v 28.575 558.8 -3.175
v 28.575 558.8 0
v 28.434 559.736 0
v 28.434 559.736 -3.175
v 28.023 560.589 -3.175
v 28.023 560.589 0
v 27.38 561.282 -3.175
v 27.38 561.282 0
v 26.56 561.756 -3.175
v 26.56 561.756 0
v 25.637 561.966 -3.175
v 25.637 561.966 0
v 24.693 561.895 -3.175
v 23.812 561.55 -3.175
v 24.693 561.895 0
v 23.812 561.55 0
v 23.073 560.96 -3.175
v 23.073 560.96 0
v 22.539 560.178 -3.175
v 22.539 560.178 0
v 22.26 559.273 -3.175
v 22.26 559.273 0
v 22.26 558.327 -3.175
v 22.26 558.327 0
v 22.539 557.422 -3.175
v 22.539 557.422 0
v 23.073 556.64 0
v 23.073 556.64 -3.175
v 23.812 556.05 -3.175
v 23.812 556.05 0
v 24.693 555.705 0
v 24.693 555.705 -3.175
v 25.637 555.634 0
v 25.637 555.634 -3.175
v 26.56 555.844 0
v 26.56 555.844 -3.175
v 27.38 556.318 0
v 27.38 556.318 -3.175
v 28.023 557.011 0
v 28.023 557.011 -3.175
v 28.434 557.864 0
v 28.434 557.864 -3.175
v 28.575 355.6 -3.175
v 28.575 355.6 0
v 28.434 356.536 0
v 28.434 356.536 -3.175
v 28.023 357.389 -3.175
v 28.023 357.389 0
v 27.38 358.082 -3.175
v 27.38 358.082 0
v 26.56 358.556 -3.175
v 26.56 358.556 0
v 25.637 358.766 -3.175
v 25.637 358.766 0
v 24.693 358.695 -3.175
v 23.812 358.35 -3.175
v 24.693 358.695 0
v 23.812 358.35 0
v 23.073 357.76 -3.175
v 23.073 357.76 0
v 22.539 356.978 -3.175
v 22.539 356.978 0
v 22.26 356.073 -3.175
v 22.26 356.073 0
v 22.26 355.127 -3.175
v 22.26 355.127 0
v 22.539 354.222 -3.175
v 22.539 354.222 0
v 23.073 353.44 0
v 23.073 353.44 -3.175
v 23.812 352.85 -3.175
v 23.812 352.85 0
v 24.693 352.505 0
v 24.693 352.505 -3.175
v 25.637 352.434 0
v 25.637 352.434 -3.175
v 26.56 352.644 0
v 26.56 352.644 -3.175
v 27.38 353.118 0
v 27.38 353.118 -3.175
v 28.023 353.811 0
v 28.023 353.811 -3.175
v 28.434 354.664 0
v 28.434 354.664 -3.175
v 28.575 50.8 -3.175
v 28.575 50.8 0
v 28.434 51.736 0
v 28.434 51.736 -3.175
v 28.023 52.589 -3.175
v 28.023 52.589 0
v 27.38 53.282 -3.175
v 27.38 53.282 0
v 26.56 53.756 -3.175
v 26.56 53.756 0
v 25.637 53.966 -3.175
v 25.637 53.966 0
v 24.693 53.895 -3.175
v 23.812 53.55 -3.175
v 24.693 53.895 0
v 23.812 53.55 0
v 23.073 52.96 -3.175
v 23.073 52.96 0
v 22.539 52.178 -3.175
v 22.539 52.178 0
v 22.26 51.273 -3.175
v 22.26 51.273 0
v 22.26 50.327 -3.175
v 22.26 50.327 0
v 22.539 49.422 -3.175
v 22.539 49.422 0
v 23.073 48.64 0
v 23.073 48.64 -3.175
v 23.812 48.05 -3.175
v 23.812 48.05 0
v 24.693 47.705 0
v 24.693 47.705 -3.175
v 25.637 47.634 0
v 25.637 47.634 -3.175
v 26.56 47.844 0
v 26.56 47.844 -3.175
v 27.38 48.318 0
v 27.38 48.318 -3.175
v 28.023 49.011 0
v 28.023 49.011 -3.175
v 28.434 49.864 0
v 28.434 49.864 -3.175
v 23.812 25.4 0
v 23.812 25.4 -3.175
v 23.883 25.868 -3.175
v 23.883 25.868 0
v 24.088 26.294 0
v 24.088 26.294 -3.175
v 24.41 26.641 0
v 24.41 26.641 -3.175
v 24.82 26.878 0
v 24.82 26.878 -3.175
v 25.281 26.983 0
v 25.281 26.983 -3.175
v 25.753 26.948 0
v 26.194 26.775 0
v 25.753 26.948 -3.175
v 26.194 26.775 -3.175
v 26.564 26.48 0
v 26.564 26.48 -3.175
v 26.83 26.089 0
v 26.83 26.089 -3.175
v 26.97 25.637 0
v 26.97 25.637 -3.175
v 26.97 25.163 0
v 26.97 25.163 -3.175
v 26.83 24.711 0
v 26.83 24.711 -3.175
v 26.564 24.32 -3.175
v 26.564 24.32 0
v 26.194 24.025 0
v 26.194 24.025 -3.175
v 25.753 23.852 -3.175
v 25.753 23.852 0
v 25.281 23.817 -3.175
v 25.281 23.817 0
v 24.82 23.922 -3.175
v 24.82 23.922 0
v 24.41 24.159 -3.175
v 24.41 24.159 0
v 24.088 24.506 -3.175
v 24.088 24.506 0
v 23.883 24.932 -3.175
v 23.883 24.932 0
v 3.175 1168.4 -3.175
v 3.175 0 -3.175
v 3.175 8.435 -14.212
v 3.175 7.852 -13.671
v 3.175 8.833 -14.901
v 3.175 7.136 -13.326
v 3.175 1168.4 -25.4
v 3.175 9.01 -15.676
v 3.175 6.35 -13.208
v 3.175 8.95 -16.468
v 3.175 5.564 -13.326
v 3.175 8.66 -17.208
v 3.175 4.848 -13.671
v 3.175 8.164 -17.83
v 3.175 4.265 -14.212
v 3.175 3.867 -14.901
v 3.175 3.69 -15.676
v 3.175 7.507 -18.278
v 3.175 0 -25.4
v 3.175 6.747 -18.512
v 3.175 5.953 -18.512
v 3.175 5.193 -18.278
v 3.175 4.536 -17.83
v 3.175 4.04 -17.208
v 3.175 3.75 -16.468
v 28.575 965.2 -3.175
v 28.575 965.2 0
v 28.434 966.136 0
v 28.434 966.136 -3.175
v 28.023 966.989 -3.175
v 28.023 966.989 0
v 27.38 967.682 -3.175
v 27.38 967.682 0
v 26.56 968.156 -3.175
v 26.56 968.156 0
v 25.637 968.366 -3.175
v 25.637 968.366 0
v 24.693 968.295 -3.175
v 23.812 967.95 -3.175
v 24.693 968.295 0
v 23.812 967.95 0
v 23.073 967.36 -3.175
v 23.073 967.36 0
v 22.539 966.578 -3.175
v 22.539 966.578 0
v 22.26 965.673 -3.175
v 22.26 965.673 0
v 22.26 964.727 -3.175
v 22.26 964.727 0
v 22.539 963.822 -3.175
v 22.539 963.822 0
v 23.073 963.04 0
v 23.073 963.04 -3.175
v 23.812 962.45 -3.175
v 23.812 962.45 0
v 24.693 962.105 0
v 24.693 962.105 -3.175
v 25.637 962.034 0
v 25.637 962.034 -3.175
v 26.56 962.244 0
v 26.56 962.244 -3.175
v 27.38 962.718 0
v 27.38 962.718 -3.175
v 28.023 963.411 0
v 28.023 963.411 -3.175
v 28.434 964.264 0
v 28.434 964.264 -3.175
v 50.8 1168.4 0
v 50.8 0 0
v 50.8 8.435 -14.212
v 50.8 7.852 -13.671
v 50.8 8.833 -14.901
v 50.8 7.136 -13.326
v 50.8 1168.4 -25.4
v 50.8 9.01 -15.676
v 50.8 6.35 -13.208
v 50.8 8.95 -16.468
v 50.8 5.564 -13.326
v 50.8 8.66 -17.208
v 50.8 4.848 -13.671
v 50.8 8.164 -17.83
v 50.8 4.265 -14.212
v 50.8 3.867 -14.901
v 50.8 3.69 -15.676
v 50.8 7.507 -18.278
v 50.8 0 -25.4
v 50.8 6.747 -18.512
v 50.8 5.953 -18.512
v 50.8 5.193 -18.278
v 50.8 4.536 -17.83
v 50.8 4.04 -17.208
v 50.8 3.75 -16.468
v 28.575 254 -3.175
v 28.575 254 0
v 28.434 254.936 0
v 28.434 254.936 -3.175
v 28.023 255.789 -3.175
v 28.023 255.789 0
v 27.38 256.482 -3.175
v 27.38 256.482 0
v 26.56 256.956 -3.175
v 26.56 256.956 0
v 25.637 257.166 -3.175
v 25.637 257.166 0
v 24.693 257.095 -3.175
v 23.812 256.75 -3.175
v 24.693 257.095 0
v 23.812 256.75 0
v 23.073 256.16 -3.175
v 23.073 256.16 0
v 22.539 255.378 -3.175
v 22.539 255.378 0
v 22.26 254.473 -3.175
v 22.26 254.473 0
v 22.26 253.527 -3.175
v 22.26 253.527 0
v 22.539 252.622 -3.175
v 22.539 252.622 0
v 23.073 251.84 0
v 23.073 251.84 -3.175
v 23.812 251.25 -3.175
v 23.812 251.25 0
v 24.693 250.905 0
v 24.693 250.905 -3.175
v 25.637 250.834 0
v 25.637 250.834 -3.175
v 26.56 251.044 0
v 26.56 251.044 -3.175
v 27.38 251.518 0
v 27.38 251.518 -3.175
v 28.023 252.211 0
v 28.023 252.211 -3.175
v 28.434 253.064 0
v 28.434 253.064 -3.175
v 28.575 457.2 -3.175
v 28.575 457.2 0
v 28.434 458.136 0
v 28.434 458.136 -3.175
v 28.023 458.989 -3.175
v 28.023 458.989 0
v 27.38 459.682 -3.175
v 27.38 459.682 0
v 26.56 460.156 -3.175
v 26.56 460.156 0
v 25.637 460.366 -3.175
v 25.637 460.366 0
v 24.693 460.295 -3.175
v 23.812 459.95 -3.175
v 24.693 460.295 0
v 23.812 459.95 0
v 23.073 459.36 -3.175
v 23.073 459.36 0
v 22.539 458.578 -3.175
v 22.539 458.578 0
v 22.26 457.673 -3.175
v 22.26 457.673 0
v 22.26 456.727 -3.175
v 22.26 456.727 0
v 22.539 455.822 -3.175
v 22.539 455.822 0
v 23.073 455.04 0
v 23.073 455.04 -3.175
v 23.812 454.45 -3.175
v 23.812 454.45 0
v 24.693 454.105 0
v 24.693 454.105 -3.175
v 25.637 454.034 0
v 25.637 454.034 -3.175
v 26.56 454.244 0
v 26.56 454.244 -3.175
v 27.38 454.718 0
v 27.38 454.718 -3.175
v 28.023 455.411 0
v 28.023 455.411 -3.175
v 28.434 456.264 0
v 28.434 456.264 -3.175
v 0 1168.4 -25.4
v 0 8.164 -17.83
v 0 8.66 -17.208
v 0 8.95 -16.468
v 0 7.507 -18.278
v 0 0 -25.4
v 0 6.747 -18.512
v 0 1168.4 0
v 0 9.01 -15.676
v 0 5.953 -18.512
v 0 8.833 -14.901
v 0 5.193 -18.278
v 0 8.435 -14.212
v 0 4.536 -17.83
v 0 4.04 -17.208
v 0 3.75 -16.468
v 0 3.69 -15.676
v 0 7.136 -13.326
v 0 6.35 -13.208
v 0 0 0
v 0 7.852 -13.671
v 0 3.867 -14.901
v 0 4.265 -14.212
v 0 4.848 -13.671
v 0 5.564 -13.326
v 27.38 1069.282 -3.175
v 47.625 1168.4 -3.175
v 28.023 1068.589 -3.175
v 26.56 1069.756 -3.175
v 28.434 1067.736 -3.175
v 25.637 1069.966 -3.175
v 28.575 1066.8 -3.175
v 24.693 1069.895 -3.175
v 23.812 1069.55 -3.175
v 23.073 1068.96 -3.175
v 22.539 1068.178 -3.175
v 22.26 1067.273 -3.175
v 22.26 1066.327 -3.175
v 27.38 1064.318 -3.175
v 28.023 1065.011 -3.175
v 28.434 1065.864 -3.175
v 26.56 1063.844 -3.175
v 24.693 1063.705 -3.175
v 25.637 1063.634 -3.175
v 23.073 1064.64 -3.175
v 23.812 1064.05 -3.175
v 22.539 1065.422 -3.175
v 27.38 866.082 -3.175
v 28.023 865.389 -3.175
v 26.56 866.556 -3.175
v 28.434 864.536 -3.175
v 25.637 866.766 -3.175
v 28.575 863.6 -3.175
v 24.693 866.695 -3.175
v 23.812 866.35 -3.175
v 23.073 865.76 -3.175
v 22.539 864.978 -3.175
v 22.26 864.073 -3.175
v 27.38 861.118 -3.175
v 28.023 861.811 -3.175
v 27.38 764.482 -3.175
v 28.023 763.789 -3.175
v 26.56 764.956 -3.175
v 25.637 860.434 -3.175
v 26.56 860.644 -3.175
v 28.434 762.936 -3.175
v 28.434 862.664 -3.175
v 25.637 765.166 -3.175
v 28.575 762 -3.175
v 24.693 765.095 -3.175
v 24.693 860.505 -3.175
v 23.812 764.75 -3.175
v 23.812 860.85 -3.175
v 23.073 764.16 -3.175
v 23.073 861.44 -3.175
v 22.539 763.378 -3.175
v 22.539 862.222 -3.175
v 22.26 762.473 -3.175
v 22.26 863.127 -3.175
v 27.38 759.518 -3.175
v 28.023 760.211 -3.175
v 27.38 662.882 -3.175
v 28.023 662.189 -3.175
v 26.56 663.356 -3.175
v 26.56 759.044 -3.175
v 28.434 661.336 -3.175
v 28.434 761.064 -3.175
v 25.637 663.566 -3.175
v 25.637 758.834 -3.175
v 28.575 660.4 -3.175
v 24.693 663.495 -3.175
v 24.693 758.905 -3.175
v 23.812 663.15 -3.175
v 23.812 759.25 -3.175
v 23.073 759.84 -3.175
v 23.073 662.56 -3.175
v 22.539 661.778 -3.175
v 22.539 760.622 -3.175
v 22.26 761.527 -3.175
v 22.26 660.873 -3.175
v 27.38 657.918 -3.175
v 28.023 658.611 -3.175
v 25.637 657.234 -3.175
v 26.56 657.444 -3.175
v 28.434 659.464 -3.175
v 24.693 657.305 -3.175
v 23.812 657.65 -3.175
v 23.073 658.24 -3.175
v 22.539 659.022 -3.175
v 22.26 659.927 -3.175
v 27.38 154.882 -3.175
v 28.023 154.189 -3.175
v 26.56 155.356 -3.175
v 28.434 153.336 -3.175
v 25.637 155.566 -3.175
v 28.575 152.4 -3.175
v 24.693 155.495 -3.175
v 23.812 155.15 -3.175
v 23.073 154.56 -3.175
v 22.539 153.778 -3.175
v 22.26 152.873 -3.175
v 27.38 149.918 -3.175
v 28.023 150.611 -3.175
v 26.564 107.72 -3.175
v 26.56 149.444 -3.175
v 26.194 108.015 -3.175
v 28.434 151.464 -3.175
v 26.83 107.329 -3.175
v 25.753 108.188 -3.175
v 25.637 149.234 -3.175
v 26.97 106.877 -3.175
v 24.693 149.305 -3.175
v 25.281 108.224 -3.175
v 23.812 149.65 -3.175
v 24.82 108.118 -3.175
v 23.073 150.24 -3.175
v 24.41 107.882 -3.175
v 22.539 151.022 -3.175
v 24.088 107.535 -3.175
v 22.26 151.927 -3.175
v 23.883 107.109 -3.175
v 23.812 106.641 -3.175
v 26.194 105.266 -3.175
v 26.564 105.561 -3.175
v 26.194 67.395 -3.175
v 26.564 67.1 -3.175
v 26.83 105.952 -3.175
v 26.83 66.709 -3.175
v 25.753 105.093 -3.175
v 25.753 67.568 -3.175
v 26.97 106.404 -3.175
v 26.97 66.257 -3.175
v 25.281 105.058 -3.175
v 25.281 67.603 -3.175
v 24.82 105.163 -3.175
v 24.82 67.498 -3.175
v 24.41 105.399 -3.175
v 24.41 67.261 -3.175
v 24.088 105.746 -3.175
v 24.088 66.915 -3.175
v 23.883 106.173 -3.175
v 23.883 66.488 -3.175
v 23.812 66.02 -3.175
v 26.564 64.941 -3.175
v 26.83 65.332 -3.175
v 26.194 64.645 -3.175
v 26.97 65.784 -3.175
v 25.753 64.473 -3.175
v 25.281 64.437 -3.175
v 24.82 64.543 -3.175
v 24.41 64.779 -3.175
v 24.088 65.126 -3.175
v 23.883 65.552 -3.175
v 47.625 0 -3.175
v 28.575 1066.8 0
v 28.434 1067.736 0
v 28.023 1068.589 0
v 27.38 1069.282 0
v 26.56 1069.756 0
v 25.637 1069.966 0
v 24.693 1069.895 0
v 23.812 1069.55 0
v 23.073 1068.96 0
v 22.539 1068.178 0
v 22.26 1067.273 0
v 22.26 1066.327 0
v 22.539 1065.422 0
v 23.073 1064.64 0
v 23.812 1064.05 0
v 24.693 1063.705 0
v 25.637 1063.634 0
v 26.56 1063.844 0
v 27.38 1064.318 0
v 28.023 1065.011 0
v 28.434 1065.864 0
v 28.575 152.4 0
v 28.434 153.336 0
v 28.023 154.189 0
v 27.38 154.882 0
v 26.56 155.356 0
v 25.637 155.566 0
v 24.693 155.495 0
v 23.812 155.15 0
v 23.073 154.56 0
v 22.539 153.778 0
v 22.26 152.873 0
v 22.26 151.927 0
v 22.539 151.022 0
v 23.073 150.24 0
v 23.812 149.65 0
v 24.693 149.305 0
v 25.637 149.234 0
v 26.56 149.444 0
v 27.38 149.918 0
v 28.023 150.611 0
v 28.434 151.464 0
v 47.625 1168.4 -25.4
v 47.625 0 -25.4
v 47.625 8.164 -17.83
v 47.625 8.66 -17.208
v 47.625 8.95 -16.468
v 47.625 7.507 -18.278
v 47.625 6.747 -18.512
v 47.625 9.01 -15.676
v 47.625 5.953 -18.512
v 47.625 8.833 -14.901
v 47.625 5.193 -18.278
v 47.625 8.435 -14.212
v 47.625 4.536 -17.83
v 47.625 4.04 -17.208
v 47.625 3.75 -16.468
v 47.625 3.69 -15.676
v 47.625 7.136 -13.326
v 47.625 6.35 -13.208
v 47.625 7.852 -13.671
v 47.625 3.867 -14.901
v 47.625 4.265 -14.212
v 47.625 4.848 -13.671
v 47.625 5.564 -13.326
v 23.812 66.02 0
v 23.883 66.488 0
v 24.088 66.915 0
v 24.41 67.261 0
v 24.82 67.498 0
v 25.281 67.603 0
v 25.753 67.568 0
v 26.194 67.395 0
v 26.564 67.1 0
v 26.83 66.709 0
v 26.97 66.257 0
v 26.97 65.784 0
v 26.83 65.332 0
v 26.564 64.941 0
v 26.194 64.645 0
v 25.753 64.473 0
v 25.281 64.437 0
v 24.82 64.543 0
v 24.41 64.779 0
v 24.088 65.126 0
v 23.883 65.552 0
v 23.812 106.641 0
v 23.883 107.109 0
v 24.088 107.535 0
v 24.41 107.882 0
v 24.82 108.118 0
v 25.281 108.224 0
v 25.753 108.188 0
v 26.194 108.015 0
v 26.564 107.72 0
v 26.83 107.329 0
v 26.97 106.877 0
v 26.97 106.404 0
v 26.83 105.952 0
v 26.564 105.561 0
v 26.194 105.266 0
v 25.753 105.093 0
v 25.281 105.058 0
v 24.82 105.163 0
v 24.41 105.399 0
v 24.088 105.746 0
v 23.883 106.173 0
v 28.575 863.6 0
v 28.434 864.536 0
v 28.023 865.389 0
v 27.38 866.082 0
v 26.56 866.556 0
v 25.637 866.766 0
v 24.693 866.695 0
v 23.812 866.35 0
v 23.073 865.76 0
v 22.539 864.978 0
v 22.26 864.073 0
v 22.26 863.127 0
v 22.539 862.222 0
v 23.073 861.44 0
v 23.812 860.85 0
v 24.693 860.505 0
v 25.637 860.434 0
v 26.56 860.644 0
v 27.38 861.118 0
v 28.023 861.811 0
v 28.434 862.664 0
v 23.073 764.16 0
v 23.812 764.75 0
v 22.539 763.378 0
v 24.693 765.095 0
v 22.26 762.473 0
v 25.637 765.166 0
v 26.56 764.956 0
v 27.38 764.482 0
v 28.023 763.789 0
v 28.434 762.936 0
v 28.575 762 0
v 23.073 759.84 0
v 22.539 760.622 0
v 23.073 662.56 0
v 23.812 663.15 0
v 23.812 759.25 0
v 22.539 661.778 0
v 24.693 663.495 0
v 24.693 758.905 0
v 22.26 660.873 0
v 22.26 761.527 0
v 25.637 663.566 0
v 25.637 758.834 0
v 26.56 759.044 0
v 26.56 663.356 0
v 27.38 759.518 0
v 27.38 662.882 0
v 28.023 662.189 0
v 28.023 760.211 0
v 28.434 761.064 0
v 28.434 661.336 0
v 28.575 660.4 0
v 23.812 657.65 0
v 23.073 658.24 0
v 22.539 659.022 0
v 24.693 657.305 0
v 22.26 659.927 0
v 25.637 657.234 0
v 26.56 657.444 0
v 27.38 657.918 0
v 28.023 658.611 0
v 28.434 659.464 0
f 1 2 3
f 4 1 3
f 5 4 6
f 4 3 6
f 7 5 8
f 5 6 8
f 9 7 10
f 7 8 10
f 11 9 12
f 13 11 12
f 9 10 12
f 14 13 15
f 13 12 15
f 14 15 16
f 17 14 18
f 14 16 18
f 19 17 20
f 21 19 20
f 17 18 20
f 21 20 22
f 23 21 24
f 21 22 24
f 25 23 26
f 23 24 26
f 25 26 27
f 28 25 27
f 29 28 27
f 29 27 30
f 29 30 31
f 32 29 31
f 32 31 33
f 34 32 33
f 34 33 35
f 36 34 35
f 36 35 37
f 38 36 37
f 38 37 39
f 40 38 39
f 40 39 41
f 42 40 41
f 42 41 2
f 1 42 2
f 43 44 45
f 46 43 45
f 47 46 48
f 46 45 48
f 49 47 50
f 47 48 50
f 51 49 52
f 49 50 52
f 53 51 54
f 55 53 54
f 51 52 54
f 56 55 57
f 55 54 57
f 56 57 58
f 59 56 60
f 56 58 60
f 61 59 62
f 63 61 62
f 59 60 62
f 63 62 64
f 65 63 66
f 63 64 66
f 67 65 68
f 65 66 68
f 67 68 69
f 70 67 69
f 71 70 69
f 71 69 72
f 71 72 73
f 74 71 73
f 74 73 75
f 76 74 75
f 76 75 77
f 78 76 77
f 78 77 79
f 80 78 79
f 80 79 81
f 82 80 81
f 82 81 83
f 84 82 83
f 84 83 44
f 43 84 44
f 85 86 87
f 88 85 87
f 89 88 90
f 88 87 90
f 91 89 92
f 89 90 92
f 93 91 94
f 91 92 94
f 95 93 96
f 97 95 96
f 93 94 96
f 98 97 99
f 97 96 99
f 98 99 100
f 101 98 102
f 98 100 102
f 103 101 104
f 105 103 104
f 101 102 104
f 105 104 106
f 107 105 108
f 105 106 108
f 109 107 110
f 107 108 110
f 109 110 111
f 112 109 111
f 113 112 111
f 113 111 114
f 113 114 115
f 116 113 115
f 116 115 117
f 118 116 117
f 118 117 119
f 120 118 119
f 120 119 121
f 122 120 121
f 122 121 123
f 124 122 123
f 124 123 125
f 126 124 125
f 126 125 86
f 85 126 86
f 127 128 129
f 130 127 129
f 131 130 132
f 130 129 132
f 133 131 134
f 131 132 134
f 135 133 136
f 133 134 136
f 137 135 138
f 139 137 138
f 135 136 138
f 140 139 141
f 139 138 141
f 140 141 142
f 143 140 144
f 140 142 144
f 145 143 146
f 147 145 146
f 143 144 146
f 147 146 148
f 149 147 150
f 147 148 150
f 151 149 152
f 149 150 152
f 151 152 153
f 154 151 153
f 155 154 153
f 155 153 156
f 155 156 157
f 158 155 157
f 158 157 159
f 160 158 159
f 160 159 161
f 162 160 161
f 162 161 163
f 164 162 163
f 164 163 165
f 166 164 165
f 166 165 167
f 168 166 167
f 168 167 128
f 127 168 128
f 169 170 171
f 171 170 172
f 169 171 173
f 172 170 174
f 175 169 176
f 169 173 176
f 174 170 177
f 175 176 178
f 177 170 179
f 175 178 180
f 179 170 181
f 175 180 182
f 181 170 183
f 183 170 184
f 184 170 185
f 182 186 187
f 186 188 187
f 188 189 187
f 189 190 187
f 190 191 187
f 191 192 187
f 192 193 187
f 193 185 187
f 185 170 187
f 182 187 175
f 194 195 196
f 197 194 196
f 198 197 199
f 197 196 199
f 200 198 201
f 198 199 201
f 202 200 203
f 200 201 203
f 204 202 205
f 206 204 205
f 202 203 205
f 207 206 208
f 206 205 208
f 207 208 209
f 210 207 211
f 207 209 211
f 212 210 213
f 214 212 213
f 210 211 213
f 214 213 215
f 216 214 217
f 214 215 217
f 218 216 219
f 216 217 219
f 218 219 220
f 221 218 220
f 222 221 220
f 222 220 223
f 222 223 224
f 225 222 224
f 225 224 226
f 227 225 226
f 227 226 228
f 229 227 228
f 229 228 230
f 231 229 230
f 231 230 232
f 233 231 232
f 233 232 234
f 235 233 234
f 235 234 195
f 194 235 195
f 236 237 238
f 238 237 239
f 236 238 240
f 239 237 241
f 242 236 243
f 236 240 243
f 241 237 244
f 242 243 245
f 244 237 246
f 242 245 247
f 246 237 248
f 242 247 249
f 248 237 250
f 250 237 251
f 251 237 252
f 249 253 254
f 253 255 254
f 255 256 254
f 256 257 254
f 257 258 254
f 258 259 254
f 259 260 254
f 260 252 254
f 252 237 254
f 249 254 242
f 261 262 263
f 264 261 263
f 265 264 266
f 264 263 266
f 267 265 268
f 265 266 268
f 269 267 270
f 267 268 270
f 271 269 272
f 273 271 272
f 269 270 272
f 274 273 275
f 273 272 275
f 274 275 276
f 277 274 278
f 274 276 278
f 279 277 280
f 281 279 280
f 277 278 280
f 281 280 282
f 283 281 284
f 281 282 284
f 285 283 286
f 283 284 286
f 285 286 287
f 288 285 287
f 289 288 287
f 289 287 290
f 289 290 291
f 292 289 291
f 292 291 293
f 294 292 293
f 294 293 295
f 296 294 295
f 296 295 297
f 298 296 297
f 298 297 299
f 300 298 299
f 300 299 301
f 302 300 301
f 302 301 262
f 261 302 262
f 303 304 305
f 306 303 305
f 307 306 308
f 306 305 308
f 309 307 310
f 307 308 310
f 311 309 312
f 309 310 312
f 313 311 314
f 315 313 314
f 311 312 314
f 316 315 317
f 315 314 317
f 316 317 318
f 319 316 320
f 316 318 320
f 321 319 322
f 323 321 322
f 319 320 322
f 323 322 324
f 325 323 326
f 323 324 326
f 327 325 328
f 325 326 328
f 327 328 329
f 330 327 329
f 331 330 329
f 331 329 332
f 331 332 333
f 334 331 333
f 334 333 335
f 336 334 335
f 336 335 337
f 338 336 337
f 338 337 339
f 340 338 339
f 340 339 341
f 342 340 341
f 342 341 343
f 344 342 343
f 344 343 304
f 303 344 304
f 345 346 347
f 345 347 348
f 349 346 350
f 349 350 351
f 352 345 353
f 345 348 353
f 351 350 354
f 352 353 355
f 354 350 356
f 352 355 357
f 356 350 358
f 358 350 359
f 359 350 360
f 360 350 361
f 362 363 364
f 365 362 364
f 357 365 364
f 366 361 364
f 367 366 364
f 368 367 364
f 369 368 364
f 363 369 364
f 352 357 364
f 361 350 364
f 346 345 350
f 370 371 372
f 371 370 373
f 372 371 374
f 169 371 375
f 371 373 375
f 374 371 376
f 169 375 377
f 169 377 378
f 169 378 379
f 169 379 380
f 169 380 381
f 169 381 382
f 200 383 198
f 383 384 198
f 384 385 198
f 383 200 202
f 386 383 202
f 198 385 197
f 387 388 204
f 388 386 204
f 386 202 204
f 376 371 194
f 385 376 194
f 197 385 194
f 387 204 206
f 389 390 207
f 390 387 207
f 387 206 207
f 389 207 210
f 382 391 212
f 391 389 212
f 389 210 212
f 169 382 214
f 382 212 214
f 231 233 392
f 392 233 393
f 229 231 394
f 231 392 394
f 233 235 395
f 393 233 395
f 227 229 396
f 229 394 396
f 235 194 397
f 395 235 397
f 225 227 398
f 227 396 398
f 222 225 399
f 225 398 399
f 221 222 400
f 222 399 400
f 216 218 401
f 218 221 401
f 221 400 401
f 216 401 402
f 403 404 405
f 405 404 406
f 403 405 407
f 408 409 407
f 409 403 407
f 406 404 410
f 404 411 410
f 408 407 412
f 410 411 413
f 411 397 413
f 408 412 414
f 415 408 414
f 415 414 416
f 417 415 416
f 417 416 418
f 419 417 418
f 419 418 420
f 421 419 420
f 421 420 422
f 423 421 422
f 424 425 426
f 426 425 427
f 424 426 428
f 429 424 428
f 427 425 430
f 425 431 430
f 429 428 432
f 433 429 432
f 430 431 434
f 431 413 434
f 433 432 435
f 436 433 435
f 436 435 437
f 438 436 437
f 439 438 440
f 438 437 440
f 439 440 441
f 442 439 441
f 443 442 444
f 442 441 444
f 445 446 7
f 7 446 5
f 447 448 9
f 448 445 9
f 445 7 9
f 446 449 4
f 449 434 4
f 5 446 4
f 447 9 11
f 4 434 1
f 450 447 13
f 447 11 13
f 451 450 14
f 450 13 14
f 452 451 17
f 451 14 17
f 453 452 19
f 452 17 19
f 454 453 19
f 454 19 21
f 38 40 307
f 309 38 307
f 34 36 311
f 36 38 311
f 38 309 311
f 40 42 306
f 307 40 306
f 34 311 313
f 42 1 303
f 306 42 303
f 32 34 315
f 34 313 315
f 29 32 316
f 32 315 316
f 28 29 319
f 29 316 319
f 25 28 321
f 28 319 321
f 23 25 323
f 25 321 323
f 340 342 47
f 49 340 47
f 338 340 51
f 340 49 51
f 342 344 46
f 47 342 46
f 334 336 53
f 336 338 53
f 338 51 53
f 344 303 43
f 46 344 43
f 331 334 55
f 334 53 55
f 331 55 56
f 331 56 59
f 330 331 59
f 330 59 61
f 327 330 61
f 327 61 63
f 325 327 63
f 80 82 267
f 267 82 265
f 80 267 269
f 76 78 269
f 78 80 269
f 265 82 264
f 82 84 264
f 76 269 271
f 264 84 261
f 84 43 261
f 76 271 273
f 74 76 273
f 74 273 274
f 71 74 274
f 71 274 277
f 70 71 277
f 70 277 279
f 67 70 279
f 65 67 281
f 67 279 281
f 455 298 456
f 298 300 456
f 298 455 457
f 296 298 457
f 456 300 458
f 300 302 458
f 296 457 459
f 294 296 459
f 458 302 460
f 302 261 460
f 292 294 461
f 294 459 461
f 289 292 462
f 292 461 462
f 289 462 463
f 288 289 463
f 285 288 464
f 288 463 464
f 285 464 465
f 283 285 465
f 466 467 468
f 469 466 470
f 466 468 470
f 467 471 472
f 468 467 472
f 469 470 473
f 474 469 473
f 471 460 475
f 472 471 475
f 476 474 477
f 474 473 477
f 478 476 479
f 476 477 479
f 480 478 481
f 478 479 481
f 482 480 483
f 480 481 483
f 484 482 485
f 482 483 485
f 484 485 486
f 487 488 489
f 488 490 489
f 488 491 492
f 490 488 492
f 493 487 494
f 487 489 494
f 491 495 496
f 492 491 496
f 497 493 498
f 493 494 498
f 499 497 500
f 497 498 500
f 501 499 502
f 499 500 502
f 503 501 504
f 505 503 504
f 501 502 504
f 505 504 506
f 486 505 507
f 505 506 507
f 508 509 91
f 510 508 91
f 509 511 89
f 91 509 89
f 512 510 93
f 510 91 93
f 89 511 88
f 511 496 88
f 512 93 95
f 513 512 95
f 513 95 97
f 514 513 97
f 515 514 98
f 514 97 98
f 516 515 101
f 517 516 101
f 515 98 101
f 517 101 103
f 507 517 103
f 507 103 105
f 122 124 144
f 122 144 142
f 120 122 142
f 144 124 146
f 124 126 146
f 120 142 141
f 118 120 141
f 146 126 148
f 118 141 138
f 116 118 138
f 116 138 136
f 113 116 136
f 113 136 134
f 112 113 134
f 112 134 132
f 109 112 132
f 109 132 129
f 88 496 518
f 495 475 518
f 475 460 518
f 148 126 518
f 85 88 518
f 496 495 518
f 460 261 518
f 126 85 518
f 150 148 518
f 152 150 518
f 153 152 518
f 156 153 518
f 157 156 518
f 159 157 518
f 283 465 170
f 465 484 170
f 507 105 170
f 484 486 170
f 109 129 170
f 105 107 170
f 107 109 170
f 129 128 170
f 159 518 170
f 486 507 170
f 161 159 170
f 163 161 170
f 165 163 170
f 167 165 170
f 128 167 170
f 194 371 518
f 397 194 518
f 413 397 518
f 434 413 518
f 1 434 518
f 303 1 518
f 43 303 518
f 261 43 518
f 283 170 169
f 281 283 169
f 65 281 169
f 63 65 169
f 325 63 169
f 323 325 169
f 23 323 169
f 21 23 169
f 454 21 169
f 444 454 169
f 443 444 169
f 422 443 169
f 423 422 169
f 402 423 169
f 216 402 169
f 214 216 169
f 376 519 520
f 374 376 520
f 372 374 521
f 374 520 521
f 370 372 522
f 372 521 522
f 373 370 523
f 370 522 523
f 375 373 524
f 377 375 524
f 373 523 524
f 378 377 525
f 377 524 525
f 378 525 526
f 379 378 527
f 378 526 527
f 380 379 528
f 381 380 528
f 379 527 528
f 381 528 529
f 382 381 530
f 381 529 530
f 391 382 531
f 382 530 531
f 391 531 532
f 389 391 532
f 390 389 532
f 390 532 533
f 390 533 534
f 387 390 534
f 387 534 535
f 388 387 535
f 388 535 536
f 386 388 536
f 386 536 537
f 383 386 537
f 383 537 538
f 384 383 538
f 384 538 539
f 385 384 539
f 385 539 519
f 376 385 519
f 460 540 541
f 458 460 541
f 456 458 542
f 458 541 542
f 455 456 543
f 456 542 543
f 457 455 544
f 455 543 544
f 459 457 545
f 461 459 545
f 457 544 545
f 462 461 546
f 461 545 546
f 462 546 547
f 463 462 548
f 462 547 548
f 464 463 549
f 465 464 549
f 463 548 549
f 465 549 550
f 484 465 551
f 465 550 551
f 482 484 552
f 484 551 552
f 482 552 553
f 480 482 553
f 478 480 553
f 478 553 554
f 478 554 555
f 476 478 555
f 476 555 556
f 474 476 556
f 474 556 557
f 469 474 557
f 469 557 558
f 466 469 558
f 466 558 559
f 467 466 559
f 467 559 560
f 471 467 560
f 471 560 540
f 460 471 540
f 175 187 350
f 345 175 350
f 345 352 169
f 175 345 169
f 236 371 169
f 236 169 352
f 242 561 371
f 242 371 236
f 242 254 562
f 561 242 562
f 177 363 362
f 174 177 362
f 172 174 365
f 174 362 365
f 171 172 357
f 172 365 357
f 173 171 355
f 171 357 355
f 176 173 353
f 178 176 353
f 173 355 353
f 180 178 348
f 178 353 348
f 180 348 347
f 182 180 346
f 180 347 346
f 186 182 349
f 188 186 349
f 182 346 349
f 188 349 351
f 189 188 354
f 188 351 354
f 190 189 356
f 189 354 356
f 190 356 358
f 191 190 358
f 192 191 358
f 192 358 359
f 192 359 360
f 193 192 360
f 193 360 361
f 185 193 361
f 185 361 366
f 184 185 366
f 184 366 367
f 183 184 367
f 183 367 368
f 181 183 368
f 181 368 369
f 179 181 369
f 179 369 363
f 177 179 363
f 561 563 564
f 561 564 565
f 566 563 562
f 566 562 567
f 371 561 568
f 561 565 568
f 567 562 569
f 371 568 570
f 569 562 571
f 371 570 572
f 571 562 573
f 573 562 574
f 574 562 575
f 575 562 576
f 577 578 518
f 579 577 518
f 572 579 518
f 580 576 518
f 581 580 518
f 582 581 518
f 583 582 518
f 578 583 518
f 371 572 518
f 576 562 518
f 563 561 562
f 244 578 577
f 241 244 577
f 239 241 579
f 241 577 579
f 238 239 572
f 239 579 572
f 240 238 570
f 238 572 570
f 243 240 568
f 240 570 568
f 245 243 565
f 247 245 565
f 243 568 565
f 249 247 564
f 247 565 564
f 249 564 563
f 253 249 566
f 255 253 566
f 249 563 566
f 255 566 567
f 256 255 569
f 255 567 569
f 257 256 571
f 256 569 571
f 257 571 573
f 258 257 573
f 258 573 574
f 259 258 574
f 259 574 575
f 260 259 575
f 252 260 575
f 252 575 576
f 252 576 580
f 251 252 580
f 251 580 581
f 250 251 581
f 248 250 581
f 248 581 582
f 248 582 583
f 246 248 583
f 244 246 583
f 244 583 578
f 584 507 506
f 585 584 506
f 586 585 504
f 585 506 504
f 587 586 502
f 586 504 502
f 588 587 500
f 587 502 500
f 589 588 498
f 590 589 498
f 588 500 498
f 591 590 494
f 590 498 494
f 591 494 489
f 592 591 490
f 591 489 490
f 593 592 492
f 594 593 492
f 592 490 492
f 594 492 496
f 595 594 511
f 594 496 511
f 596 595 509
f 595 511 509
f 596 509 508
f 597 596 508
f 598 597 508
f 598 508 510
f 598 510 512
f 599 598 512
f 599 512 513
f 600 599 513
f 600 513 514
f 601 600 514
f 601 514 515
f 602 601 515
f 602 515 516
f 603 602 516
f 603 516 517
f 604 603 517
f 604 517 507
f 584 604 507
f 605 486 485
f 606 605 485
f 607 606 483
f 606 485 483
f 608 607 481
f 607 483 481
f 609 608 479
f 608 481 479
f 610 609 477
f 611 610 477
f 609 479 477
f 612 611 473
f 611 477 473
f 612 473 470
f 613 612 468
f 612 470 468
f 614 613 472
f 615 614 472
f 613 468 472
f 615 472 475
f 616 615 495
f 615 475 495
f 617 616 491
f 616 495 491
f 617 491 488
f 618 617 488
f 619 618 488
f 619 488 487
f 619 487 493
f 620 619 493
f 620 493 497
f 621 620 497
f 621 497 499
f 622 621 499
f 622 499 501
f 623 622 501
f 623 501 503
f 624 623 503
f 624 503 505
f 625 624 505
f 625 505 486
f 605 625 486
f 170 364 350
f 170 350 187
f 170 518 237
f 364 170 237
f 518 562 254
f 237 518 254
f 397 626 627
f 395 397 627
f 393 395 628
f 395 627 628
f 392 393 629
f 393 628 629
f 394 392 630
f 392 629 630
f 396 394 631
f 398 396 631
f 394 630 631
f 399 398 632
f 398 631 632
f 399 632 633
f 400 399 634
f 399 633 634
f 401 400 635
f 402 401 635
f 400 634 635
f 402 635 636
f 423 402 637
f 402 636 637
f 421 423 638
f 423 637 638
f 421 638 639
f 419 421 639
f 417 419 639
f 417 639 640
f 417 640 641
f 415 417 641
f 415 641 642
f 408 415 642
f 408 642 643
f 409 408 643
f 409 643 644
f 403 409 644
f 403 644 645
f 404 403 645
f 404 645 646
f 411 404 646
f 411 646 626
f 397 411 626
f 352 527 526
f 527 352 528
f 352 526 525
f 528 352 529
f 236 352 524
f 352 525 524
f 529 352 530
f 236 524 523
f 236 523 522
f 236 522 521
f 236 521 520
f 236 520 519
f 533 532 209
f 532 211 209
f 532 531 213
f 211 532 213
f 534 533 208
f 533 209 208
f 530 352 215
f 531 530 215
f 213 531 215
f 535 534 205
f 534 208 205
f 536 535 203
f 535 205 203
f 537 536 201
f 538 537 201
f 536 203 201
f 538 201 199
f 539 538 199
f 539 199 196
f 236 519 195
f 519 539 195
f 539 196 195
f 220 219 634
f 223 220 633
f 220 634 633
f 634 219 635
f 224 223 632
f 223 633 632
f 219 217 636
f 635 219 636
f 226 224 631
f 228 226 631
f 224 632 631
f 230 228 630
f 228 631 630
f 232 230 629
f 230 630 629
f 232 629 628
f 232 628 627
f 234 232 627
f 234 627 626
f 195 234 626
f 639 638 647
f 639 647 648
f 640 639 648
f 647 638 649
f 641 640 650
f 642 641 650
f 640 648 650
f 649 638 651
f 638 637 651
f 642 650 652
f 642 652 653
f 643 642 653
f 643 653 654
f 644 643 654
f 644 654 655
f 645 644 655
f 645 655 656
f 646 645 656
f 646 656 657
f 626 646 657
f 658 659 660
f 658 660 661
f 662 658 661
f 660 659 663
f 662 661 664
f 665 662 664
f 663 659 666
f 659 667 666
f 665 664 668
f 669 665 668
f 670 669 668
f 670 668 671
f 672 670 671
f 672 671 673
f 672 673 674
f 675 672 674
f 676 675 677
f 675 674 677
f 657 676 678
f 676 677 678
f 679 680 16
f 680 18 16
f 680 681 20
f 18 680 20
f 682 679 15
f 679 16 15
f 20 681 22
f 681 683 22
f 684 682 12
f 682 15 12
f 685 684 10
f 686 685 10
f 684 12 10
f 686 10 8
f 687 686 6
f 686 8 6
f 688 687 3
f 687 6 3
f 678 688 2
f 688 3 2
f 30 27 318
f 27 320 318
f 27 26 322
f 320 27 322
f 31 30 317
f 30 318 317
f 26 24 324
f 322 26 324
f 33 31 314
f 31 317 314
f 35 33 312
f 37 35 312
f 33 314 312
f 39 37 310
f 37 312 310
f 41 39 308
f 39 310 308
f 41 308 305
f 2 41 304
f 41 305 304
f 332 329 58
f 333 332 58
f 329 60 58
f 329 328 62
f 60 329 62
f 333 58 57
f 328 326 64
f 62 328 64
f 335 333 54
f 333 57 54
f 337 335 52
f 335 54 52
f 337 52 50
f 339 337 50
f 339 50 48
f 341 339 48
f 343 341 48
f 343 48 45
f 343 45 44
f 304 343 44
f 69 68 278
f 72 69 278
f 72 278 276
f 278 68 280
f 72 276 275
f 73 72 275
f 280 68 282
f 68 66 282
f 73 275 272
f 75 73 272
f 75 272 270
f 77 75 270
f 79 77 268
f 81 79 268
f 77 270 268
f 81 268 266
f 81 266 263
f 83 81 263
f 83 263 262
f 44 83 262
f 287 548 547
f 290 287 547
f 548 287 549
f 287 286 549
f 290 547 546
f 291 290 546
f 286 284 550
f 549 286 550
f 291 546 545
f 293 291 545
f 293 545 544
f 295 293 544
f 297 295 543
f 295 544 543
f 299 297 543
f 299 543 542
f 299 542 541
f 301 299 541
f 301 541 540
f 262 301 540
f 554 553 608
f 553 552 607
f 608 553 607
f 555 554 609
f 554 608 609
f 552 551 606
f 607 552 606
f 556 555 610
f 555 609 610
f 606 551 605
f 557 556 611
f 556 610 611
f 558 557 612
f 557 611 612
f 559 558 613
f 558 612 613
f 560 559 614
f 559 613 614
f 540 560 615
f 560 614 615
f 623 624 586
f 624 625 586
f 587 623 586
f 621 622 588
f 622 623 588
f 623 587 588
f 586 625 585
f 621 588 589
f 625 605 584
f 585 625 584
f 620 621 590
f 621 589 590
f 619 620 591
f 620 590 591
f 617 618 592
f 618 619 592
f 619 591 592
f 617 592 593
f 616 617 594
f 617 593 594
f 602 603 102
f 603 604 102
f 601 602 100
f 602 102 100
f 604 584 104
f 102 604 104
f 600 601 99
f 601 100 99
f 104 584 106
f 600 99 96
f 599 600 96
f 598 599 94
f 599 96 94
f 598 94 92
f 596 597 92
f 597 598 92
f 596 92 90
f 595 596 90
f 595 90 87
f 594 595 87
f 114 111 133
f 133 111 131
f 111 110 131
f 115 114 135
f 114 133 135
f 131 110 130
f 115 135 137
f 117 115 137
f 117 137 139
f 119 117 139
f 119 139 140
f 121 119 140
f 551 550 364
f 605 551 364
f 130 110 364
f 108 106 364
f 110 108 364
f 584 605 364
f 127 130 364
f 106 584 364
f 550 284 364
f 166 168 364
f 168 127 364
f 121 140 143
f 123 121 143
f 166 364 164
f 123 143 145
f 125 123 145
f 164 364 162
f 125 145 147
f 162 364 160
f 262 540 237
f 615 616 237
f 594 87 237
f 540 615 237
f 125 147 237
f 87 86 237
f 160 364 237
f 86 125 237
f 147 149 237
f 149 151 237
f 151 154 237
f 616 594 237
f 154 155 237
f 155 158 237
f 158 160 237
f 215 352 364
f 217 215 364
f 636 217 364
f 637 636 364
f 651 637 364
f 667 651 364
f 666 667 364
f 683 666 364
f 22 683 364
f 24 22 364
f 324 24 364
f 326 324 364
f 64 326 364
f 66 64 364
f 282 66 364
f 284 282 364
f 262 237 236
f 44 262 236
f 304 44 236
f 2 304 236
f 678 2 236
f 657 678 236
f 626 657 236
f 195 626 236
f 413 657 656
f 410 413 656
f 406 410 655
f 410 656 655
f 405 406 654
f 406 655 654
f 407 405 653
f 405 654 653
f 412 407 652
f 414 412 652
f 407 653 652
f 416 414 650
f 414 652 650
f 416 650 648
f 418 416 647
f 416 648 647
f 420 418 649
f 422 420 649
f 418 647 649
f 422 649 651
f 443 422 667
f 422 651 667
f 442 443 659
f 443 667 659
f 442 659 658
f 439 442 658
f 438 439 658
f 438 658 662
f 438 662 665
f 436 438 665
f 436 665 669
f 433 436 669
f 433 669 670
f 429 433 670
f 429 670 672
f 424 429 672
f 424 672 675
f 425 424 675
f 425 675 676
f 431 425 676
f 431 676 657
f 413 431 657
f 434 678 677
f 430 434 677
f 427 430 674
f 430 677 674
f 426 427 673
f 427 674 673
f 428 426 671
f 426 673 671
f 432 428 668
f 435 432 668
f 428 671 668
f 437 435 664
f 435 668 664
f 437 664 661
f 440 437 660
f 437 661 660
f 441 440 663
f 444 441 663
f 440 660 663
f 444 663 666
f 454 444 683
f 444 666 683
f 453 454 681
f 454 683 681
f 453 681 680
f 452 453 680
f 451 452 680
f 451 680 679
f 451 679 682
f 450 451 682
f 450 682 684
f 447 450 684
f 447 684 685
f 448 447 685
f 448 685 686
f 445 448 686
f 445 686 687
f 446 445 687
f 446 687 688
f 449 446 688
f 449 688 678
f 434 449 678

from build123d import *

# Parameters (mm, degrees)
BOSS_EXTRUDE1_DEPTH = 1168.4
CUT_EXTRUDE1_REACH  = 27.4
SKETCH2_R           = 3.175
CUT_EXTRUDE2_REACH  = 5.175
SKETCH3_R           = 1.5875
SKETCH4_R           = 2.667
CUT_EXTRUDE3_DEPTH  = 51.8


with BuildPart() as part:
    # Sketch1 → Boss-Extrude1 (new body)
    with BuildSketch(Plane(origin=(0, 0, 0), x_dir=(1, 0, 0), z_dir=(0, 1, 0))):
        Polygon((3.175, 3.175), (3.175, 25.4), (0, 25.4), (0, 0), (50.8, 0), (50.8, 25.4), (47.625, 25.4), (47.625, 3.175), align=None)
    extrude(amount=BOSS_EXTRUDE1_DEPTH)

    # Sketch2 → Cut-Extrude1 (cut, up to next)
    with BuildSketch(Plane.XY, mode=Mode.PRIVATE) as cut_extrude1_sk1:
        with Locations((25.4, 50.8)):
            Circle(SKETCH2_R)
    cut_extrude1_tool1 = extrude(cut_extrude1_sk1.sketch, amount=-CUT_EXTRUDE1_REACH, mode=Mode.PRIVATE) & part.part
    add(cut_extrude1_tool1.solids().sort_by_distance((25.4, 50.8, 0))[0], mode=Mode.SUBTRACT)
    # Sketch2 → Cut-Extrude1 (cut, up to next)
    with BuildSketch(Plane.XY, mode=Mode.PRIVATE) as cut_extrude1_sk2:
        with Locations((25.4, 152.4)):
            Circle(SKETCH2_R)
    cut_extrude1_tool2 = extrude(cut_extrude1_sk2.sketch, amount=-CUT_EXTRUDE1_REACH, mode=Mode.PRIVATE) & part.part
    add(cut_extrude1_tool2.solids().sort_by_distance((25.4, 152.4, 0))[0], mode=Mode.SUBTRACT)
    # Sketch2 → Cut-Extrude1 (cut, up to next)
    with BuildSketch(Plane.XY, mode=Mode.PRIVATE) as cut_extrude1_sk3:
        with Locations((25.4, 254)):
            Circle(SKETCH2_R)
    cut_extrude1_tool3 = extrude(cut_extrude1_sk3.sketch, amount=-CUT_EXTRUDE1_REACH, mode=Mode.PRIVATE) & part.part
    add(cut_extrude1_tool3.solids().sort_by_distance((25.4, 254, 0))[0], mode=Mode.SUBTRACT)
    # Sketch2 → Cut-Extrude1 (cut, up to next)
    with BuildSketch(Plane.XY, mode=Mode.PRIVATE) as cut_extrude1_sk4:
        with Locations((25.4, 355.6)):
            Circle(SKETCH2_R)
    cut_extrude1_tool4 = extrude(cut_extrude1_sk4.sketch, amount=-CUT_EXTRUDE1_REACH, mode=Mode.PRIVATE) & part.part
    add(cut_extrude1_tool4.solids().sort_by_distance((25.4, 355.6, 0))[0], mode=Mode.SUBTRACT)
    # Sketch2 → Cut-Extrude1 (cut, up to next)
    with BuildSketch(Plane.XY, mode=Mode.PRIVATE) as cut_extrude1_sk5:
        with Locations((25.4, 457.2)):
            Circle(SKETCH2_R)
    cut_extrude1_tool5 = extrude(cut_extrude1_sk5.sketch, amount=-CUT_EXTRUDE1_REACH, mode=Mode.PRIVATE) & part.part
    add(cut_extrude1_tool5.solids().sort_by_distance((25.4, 457.2, 0))[0], mode=Mode.SUBTRACT)
    # Sketch2 → Cut-Extrude1 (cut, up to next)
    with BuildSketch(Plane.XY, mode=Mode.PRIVATE) as cut_extrude1_sk6:
        with Locations((25.4, 558.8)):
            Circle(SKETCH2_R)
    cut_extrude1_tool6 = extrude(cut_extrude1_sk6.sketch, amount=-CUT_EXTRUDE1_REACH, mode=Mode.PRIVATE) & part.part
    add(cut_extrude1_tool6.solids().sort_by_distance((25.4, 558.8, 0))[0], mode=Mode.SUBTRACT)
    # Sketch2 → Cut-Extrude1 (cut, up to next)
    with BuildSketch(Plane.XY, mode=Mode.PRIVATE) as cut_extrude1_sk7:
        with Locations((25.4, 660.4)):
            Circle(SKETCH2_R)
    cut_extrude1_tool7 = extrude(cut_extrude1_sk7.sketch, amount=-CUT_EXTRUDE1_REACH, mode=Mode.PRIVATE) & part.part
    add(cut_extrude1_tool7.solids().sort_by_distance((25.4, 660.4, 0))[0], mode=Mode.SUBTRACT)
    # Sketch2 → Cut-Extrude1 (cut, up to next)
    with BuildSketch(Plane.XY, mode=Mode.PRIVATE) as cut_extrude1_sk8:
        with Locations((25.4, 762)):
            Circle(SKETCH2_R)
    cut_extrude1_tool8 = extrude(cut_extrude1_sk8.sketch, amount=-CUT_EXTRUDE1_REACH, mode=Mode.PRIVATE) & part.part
    add(cut_extrude1_tool8.solids().sort_by_distance((25.4, 762, 0))[0], mode=Mode.SUBTRACT)
    # Sketch2 → Cut-Extrude1 (cut, up to next)
    with BuildSketch(Plane.XY, mode=Mode.PRIVATE) as cut_extrude1_sk9:
        with Locations((25.4, 863.6)):
            Circle(SKETCH2_R)
    cut_extrude1_tool9 = extrude(cut_extrude1_sk9.sketch, amount=-CUT_EXTRUDE1_REACH, mode=Mode.PRIVATE) & part.part
    add(cut_extrude1_tool9.solids().sort_by_distance((25.4, 863.6, 0))[0], mode=Mode.SUBTRACT)
    # Sketch2 → Cut-Extrude1 (cut, up to next)
    with BuildSketch(Plane.XY, mode=Mode.PRIVATE) as cut_extrude1_sk10:
        with Locations((25.4, 965.2)):
            Circle(SKETCH2_R)
    cut_extrude1_tool10 = extrude(cut_extrude1_sk10.sketch, amount=-CUT_EXTRUDE1_REACH, mode=Mode.PRIVATE) & part.part
    add(cut_extrude1_tool10.solids().sort_by_distance((25.4, 965.2, 0))[0], mode=Mode.SUBTRACT)
    # Sketch2 → Cut-Extrude1 (cut, up to next)
    with BuildSketch(Plane.XY, mode=Mode.PRIVATE) as cut_extrude1_sk11:
        with Locations((25.4, 1066.8)):
            Circle(SKETCH2_R)
    cut_extrude1_tool11 = extrude(cut_extrude1_sk11.sketch, amount=-CUT_EXTRUDE1_REACH, mode=Mode.PRIVATE) & part.part
    add(cut_extrude1_tool11.solids().sort_by_distance((25.4, 1066.8, 0))[0], mode=Mode.SUBTRACT)

    # Sketch3 → Cut-Extrude2 (cut, up to next)
    with BuildSketch(Plane(origin=(0, 0, -3.175), x_dir=(-1, 0, 0), z_dir=(0, 0, -1)), mode=Mode.PRIVATE) as cut_extrude2_sk1:
        with Locations((-25.4, 25.4)):
            Circle(SKETCH3_R)
    cut_extrude2_tool1 = extrude(cut_extrude2_sk1.sketch, amount=-CUT_EXTRUDE2_REACH, mode=Mode.PRIVATE) & part.part
    add(cut_extrude2_tool1.solids().sort_by_distance((25.4, 25.4, -3.175))[0], mode=Mode.SUBTRACT)
    # Sketch3 → Cut-Extrude2 (cut, up to next)
    with BuildSketch(Plane(origin=(0, 0, -3.175), x_dir=(-1, 0, 0), z_dir=(0, 0, -1)), mode=Mode.PRIVATE) as cut_extrude2_sk2:
        with Locations((-25.4, 66.020295879)):
            Circle(SKETCH3_R)
    cut_extrude2_tool2 = extrude(cut_extrude2_sk2.sketch, amount=-CUT_EXTRUDE2_REACH, mode=Mode.PRIVATE) & part.part
    add(cut_extrude2_tool2.solids().sort_by_distance((25.4, 66.020296, -3.175))[0], mode=Mode.SUBTRACT)
    # Sketch3 → Cut-Extrude2 (cut, up to next)
    with BuildSketch(Plane(origin=(0, 0, -3.175), x_dir=(-1, 0, 0), z_dir=(0, 0, -1)), mode=Mode.PRIVATE) as cut_extrude2_sk3:
        with Locations((-25.4, 106.640591758)):
            Circle(SKETCH3_R)
    cut_extrude2_tool3 = extrude(cut_extrude2_sk3.sketch, amount=-CUT_EXTRUDE2_REACH, mode=Mode.PRIVATE) & part.part
    add(cut_extrude2_tool3.solids().sort_by_distance((25.4, 106.640592, -3.175))[0], mode=Mode.SUBTRACT)

    # Sketch4 → Cut-Extrude3 (cut, through all)
    with BuildSketch(Plane.ZY):
        with Locations((-15.875, 6.35)):
            Circle(SKETCH4_R)
    extrude(amount=-CUT_EXTRUDE3_DEPTH, mode=Mode.SUBTRACT)


solid = part.part
